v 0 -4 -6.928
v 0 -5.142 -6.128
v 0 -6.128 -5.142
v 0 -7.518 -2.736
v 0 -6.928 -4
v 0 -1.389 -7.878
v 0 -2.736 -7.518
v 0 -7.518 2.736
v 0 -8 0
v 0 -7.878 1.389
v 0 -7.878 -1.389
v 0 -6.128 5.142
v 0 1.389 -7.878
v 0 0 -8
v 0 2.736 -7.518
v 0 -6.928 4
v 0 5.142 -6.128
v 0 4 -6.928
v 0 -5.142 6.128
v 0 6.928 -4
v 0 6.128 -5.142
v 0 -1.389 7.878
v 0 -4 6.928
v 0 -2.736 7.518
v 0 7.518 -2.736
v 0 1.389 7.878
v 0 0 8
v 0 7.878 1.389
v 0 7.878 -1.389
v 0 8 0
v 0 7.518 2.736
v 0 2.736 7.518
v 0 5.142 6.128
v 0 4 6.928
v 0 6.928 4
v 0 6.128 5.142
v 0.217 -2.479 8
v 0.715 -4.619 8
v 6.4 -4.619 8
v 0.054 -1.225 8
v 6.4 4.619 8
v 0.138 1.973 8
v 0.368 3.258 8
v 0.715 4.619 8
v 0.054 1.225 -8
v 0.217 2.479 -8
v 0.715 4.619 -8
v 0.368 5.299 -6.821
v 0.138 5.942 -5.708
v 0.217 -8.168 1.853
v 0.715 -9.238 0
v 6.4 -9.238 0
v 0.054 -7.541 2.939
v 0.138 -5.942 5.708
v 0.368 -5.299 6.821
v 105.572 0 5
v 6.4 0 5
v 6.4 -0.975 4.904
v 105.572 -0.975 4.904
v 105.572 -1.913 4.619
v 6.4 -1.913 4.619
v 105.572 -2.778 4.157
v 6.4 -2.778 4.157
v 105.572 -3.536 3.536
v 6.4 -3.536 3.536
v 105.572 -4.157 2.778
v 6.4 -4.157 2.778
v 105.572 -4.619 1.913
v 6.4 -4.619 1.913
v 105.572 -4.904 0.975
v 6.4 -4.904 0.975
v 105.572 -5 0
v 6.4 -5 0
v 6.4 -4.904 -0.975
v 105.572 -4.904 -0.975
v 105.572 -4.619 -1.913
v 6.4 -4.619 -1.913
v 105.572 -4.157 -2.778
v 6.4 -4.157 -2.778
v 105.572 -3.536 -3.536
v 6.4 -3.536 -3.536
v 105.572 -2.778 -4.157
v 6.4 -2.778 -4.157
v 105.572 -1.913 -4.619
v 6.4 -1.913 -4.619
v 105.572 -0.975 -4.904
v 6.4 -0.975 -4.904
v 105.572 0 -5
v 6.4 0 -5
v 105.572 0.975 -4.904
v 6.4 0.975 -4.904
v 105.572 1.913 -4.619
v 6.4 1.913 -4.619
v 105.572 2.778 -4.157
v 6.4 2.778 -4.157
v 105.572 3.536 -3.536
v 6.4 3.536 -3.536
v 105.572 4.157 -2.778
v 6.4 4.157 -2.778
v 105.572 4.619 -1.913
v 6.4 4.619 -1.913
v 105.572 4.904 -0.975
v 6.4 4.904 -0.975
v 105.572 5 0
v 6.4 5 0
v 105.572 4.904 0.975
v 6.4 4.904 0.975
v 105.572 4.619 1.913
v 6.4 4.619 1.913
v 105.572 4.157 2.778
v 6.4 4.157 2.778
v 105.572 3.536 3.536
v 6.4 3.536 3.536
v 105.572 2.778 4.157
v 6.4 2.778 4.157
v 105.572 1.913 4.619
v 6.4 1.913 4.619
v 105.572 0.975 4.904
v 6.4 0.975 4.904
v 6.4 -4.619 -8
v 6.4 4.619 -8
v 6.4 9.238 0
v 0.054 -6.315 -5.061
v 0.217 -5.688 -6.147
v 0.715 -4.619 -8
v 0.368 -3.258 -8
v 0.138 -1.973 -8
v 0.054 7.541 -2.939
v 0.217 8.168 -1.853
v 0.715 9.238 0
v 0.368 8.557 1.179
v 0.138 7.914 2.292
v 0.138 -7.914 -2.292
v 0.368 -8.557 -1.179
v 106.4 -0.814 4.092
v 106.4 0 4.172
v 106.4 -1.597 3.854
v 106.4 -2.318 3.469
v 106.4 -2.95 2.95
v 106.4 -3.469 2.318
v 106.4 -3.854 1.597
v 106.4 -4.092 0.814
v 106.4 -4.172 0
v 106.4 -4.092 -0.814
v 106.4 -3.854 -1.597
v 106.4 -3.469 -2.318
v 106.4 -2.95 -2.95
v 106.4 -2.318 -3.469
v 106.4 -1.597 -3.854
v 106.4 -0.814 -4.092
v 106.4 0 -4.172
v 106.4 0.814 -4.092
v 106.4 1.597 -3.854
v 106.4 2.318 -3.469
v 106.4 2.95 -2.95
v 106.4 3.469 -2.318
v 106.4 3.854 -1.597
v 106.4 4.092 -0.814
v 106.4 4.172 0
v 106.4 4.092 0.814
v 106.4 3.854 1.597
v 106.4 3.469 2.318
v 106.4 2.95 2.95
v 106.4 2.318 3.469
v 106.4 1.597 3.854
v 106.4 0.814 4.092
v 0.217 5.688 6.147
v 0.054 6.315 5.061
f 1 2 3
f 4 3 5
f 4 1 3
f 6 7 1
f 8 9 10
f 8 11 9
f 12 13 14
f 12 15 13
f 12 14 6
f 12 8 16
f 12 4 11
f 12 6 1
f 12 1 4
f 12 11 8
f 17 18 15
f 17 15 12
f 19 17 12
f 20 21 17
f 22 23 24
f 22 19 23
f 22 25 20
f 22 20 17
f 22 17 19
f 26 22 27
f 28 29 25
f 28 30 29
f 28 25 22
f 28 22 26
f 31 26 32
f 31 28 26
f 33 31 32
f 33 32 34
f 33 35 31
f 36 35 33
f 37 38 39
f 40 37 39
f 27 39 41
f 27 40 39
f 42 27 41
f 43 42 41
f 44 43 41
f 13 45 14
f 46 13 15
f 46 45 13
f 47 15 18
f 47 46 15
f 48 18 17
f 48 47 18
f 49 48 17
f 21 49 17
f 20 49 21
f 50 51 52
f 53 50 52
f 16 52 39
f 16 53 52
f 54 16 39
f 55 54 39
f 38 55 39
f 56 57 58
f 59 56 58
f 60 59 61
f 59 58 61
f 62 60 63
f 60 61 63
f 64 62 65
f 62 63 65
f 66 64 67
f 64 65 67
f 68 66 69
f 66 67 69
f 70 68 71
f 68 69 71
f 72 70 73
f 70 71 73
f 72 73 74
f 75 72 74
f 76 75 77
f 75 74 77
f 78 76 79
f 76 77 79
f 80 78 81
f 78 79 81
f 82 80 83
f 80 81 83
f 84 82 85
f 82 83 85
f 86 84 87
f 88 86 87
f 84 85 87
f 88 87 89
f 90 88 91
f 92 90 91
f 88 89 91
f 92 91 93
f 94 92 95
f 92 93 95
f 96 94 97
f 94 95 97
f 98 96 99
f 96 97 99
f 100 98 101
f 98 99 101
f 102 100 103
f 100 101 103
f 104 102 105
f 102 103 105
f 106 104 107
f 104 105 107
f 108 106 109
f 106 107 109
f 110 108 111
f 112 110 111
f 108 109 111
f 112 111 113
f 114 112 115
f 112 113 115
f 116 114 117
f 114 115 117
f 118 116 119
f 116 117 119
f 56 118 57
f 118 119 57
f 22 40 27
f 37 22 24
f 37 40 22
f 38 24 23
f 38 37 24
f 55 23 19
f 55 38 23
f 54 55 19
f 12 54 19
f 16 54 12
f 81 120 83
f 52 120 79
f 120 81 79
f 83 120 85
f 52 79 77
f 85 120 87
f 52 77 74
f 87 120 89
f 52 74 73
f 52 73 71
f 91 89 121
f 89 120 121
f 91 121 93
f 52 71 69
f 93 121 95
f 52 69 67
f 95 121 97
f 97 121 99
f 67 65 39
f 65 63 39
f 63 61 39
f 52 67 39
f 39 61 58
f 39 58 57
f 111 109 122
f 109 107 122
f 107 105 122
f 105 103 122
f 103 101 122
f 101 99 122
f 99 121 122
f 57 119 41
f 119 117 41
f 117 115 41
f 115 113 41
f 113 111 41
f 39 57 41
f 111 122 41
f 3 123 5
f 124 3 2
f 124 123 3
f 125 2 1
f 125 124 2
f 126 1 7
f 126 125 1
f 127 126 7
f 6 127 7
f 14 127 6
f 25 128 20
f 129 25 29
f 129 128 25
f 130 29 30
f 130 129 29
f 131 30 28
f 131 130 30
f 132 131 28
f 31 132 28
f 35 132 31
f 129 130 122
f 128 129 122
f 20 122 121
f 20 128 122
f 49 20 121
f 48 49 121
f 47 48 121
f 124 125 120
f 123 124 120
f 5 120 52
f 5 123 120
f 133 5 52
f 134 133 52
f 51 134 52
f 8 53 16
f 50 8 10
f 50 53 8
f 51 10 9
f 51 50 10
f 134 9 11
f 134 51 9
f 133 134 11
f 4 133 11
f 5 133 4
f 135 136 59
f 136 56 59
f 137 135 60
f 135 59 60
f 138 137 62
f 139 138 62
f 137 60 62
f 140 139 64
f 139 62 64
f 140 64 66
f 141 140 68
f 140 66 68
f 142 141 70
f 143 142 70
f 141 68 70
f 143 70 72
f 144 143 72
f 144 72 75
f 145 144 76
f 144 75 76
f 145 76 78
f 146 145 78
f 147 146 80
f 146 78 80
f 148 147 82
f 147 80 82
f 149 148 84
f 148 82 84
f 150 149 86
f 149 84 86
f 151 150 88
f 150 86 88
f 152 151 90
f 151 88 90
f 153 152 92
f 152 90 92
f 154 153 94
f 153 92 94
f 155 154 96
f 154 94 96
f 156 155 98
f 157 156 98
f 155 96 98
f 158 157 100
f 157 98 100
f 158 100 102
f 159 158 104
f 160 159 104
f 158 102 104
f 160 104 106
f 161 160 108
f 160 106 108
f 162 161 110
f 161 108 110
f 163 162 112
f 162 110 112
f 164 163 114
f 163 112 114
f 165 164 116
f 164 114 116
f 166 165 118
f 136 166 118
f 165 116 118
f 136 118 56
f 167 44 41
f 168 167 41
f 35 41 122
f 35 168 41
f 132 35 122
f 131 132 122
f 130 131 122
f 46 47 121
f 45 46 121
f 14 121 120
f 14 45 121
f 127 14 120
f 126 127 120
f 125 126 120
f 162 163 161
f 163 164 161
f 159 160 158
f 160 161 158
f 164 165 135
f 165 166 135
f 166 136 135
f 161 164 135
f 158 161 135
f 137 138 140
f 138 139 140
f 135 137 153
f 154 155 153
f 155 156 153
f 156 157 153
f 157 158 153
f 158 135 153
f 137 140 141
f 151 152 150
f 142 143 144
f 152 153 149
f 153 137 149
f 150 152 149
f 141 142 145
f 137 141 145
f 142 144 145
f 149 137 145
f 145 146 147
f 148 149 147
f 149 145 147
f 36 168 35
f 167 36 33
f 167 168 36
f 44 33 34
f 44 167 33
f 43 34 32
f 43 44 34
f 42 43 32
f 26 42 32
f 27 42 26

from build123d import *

# Parameters (mm, degrees)
BASEHEAD_DEPTH = 6.4


with BuildPart() as part:
    # Sketch1 → BaseHead (new body)
    with BuildSketch(Plane(origin=(0, 0, 0), x_dir=(0, 0, -1), z_dir=(1, 0, 0))):
        Polygon((8, 4.618802154), (8, -4.618802154), (0, -9.237604307), (-8, -4.618802154), (-8, 4.618802154), (0, 9.237604307), align=None)
    extrude(amount=BASEHEAD_DEPTH)

    # BodySke → BaseBody (revolve)
    with BuildSketch(Plane.XY, mode=Mode.PRIVATE) as basebody_sk:
        Polygon((0, 0), (106.4, 0), (106.4, 4.172), (105.572, 5), (0, 5), align=None)
    revolve(basebody_sk.sketch.rotate(Axis((0, 0, 0), (1, 0, 0)), 90), axis=Axis((0, 0, 0), (1, 0, 0)))

    # Sketch3 → HeadChamfer (revolve, cut)
    with BuildSketch(Plane.XY):
        Polygon((0, 8), (3.601282526, 14.237604307), (3.601282526, 19.237604307), (-10, 19.237604307), (-10, 8), align=None)
    revolve(axis=Axis((0, 0, 0), (1, 0, 0)), mode=Mode.SUBTRACT)


solid = part.part
